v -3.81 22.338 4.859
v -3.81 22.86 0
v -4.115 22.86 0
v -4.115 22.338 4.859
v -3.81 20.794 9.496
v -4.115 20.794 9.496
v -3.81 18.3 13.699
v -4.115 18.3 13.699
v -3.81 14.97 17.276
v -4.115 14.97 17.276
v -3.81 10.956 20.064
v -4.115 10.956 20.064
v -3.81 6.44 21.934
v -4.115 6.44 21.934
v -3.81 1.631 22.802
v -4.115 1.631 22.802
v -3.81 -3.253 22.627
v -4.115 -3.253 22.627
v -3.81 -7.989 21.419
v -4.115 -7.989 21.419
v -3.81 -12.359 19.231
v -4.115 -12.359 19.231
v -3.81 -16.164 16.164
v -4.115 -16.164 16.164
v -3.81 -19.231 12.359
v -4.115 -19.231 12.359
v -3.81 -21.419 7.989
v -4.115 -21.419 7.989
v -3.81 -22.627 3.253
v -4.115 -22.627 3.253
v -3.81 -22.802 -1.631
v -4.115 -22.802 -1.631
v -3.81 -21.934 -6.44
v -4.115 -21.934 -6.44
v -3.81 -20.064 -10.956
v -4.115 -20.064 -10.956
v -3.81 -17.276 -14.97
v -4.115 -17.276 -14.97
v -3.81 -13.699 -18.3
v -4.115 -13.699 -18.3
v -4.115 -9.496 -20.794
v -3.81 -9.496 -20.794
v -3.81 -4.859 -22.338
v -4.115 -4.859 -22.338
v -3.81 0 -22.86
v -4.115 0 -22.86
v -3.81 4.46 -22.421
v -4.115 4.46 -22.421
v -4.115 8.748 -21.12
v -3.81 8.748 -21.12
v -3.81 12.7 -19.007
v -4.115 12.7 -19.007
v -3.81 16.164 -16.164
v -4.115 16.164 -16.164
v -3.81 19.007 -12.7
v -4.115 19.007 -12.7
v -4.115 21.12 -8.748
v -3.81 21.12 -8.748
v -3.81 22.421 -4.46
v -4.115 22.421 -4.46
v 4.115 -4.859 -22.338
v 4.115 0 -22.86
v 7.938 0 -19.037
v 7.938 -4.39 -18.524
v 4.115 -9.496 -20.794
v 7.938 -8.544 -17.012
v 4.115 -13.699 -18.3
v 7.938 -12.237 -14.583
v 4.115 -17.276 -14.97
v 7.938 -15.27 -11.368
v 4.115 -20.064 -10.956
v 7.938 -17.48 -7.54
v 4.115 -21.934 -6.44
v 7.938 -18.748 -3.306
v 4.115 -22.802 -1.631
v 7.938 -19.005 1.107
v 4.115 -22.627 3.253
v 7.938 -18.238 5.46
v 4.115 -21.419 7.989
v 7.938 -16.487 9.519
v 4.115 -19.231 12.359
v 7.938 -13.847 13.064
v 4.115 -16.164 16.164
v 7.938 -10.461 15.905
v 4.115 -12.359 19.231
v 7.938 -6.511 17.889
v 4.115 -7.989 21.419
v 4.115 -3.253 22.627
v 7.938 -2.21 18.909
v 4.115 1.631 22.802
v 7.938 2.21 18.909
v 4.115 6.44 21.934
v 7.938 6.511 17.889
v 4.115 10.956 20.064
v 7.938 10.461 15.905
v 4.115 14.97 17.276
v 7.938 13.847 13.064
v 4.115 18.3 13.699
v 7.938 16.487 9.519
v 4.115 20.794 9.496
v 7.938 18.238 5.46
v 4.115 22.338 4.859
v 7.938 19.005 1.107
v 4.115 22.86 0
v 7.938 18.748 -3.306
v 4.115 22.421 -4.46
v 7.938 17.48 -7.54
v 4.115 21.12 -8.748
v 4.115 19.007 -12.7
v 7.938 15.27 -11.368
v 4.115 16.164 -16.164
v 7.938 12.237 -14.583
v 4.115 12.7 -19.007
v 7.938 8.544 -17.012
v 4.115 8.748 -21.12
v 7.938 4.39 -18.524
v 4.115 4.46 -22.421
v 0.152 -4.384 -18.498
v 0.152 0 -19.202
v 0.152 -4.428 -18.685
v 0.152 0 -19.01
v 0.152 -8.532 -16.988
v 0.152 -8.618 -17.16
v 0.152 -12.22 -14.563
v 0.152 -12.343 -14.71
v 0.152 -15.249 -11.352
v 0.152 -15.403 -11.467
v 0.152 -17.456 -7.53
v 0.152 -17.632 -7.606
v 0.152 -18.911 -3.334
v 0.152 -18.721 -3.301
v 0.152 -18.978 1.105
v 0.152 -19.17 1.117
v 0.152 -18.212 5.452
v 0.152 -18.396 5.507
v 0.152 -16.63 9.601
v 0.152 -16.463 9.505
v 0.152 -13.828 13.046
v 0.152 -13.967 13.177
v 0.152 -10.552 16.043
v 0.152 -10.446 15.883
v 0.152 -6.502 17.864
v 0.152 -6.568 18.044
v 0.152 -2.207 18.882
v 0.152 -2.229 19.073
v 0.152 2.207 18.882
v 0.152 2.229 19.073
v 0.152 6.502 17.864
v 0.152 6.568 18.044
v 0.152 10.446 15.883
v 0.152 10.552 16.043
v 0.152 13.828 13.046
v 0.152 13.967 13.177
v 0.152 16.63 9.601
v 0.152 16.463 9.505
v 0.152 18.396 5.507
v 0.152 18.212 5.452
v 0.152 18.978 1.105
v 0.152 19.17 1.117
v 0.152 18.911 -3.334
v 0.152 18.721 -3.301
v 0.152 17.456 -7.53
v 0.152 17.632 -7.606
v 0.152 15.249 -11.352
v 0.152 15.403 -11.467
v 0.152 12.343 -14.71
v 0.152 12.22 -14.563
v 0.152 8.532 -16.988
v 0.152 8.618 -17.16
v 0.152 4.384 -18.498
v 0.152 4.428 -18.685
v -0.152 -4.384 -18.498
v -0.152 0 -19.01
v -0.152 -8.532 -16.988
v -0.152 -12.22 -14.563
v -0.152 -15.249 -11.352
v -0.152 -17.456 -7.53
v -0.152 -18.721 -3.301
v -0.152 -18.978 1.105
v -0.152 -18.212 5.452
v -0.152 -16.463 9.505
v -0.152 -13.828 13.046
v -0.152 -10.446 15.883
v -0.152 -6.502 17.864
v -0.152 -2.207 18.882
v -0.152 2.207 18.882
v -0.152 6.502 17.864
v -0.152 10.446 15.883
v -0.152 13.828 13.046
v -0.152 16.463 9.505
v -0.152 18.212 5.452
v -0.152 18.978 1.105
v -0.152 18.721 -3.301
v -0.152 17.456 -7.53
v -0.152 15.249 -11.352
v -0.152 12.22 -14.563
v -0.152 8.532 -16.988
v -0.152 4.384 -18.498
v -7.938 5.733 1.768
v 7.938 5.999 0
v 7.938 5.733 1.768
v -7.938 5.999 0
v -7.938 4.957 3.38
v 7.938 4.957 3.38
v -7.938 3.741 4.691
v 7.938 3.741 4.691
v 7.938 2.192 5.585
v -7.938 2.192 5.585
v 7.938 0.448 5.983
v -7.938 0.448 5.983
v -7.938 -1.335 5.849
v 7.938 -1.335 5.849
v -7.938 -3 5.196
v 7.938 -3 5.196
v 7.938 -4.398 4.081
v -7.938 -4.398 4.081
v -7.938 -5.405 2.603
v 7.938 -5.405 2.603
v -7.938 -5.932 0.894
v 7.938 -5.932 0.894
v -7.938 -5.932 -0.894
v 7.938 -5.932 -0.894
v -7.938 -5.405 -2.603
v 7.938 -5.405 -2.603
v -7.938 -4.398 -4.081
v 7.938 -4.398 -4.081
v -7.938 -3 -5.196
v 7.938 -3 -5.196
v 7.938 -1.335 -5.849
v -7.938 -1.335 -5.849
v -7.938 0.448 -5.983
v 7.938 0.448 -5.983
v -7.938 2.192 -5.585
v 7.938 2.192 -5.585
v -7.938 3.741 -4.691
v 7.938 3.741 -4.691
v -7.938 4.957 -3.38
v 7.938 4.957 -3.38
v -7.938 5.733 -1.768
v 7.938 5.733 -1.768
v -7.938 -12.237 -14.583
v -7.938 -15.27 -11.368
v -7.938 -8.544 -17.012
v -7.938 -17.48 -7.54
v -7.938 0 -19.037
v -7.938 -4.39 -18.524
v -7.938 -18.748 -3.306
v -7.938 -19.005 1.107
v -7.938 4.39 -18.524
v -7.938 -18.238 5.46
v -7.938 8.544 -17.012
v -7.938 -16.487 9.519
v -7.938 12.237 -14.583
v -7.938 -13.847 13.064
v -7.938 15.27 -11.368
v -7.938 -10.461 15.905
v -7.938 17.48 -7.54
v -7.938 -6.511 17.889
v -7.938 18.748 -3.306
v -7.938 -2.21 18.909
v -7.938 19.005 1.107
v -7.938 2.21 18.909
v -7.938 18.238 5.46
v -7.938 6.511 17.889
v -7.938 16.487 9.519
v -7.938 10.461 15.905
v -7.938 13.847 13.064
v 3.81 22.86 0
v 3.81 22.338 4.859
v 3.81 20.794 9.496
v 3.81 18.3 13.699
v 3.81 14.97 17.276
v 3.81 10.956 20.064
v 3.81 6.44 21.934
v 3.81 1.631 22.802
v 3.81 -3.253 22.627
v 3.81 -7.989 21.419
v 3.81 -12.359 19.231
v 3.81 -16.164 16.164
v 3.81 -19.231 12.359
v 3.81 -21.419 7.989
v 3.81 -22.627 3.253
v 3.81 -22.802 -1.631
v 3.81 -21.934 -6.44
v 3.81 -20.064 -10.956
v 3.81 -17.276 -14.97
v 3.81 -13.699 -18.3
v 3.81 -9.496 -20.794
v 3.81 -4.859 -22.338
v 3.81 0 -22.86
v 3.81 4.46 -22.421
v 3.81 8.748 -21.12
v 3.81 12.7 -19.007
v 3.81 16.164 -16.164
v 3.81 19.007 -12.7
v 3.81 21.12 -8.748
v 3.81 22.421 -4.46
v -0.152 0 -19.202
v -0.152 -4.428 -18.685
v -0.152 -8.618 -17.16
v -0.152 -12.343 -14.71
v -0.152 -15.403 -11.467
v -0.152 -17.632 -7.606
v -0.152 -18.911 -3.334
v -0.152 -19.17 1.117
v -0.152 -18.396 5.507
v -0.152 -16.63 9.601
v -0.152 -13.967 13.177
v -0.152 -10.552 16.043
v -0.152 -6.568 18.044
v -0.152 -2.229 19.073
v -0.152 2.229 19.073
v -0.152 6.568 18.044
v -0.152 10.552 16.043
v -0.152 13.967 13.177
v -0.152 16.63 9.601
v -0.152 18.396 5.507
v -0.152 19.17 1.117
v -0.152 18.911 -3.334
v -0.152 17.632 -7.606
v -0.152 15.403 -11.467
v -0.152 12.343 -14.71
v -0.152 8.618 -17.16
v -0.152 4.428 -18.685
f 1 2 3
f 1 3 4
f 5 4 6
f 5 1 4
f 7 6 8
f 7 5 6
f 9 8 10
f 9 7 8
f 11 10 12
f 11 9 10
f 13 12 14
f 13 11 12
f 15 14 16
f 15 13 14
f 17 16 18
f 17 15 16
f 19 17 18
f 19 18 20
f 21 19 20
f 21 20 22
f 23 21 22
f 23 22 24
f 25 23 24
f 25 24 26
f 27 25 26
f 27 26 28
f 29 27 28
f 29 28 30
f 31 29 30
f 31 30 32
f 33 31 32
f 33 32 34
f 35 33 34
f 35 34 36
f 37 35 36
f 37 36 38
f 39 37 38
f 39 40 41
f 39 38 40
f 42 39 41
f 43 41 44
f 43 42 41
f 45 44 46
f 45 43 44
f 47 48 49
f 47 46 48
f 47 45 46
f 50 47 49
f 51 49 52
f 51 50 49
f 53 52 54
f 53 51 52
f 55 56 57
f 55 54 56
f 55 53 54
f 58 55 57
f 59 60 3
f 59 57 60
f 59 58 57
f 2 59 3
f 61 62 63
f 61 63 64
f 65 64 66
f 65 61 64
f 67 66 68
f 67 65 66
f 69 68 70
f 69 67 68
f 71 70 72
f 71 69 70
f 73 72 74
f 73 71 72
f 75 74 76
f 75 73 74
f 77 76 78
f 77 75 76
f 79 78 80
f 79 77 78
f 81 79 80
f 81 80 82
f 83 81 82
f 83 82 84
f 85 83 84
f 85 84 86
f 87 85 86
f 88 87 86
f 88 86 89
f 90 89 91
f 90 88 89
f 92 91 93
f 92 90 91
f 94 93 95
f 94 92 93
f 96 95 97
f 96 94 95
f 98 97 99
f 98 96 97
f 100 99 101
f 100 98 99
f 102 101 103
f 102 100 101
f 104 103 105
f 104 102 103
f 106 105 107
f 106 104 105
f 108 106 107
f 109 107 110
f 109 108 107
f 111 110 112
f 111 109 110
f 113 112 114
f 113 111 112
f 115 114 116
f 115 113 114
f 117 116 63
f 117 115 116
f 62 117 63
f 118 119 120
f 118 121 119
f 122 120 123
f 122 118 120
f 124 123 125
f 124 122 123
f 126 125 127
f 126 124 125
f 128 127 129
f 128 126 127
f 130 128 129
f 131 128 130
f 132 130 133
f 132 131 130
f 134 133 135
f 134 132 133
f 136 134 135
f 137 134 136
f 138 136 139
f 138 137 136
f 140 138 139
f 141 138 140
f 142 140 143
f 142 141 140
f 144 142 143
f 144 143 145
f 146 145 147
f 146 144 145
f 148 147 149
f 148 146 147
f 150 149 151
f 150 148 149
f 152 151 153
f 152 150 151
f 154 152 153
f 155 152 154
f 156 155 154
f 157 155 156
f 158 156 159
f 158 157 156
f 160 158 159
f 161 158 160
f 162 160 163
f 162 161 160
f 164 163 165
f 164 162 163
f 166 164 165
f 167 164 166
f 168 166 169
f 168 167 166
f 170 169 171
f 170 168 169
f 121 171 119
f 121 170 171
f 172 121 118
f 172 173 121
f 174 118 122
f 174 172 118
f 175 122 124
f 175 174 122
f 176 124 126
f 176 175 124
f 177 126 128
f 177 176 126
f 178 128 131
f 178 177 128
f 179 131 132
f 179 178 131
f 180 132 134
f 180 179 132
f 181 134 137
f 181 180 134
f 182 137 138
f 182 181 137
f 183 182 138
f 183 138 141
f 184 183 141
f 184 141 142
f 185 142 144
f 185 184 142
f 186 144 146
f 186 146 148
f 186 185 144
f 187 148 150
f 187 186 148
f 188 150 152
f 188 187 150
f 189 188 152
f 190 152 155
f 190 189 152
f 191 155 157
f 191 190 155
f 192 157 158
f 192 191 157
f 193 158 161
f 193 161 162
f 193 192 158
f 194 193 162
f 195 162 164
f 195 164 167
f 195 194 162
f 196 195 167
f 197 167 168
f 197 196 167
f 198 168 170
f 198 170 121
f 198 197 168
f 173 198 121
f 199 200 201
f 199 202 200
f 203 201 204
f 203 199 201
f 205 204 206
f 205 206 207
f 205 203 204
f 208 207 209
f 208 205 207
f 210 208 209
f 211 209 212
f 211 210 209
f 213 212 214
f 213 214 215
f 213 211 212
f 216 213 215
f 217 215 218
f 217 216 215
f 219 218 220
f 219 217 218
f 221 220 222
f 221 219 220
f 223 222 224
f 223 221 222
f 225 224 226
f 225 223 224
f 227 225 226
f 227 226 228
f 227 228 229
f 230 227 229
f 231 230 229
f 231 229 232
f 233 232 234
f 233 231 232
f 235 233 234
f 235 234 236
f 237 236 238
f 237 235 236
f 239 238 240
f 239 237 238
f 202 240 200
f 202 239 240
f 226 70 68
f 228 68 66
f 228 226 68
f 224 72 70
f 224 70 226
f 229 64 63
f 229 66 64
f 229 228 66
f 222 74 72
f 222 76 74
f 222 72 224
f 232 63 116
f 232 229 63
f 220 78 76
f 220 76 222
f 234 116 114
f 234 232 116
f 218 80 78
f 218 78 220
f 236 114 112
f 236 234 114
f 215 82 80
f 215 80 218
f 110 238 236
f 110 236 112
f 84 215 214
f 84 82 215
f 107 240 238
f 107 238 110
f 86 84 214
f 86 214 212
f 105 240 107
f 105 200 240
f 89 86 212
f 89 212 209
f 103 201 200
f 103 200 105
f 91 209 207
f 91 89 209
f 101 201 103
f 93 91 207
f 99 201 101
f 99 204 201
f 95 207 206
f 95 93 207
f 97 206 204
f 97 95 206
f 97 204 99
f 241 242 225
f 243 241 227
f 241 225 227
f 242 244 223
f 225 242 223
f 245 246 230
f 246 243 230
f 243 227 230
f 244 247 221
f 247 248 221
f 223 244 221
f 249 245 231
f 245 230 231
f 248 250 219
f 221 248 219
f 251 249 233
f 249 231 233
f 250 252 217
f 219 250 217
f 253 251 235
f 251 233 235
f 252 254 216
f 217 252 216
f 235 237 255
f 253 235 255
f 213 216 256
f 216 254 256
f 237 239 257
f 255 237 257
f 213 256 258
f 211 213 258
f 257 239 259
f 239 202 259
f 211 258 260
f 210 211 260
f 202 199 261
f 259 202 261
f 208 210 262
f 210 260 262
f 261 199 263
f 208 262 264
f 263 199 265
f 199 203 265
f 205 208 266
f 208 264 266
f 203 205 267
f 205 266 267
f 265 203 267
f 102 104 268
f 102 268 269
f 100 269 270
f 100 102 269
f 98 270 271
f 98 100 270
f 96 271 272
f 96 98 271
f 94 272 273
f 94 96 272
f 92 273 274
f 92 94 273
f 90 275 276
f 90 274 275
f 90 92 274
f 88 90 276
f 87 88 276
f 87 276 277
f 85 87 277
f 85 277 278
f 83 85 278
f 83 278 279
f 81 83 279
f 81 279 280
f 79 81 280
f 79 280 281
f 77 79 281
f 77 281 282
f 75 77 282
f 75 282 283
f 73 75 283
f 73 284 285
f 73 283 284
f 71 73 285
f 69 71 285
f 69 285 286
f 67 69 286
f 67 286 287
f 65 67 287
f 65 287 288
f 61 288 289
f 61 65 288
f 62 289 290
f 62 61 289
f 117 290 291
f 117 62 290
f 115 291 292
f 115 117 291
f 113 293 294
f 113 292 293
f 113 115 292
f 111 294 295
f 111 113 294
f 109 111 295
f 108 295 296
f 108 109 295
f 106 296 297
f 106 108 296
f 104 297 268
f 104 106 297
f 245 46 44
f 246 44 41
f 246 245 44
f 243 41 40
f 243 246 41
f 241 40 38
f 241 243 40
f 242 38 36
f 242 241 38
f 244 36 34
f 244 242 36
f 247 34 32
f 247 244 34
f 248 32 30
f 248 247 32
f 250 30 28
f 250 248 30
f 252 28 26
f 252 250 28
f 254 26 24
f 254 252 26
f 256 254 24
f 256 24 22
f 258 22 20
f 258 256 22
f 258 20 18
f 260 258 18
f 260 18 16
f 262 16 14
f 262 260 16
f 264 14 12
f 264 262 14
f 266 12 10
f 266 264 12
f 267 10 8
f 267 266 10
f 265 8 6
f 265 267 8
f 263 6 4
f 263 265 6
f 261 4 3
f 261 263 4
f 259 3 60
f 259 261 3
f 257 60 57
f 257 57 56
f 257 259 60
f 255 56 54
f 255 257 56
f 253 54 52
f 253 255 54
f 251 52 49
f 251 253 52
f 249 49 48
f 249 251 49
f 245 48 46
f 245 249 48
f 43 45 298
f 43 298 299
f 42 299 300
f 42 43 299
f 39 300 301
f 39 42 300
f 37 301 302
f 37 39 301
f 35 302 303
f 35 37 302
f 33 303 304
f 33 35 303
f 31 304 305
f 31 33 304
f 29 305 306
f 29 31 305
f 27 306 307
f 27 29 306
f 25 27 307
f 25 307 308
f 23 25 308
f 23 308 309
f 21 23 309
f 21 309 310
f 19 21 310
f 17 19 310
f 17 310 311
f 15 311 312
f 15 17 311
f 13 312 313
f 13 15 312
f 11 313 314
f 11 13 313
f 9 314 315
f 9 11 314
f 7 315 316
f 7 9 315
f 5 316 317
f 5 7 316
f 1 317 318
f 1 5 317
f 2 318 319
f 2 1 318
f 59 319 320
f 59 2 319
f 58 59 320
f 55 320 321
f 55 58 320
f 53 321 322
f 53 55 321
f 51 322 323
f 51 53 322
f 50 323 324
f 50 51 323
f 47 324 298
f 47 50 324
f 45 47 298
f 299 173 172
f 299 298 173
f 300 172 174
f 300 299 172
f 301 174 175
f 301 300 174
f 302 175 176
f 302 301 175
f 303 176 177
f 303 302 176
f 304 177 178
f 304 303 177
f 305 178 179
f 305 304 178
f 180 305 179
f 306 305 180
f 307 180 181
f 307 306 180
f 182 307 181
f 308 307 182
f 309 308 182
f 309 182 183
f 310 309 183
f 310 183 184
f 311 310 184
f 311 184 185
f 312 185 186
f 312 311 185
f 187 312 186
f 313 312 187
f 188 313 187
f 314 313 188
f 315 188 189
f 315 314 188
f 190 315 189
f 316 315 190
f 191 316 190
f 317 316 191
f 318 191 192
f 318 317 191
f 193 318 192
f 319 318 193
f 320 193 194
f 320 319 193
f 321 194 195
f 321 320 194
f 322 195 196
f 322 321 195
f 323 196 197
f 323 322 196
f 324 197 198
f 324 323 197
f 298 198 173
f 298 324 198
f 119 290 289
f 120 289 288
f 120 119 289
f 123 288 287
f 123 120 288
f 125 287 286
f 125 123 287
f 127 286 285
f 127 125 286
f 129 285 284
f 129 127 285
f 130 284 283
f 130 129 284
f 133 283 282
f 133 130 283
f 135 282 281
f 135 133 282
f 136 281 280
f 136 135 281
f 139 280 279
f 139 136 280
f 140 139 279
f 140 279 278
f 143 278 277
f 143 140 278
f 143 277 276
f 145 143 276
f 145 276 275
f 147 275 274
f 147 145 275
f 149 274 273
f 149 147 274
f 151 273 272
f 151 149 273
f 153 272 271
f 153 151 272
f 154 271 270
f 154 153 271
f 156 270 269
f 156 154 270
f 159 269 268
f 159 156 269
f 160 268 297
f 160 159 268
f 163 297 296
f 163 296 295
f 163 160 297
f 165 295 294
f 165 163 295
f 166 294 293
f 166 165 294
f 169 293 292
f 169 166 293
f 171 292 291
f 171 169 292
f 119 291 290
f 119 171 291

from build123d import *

# Parameters (mm, degrees)
F0_R     = 22.86
F0_R_2   = 5.99948
F1_DEPTH = 7.9375


with BuildPart() as f1:
    # F0 (on Right) → F1 (new body, symmetric)
    with BuildSketch(Plane.YZ):
        Circle(F0_R)
        Circle(F0_R_2, mode=Mode.SUBTRACT)
    extrude(amount=F1_DEPTH, both=True)

    # F3: sweep along a path in F3_path
    with BuildLine(Plane(origin=(7.9375, 22.86, 0), x_dir=(0, 0, -1), z_dir=(-1, 0, 0))) as f3_path:
        CenterArc((0, 22.86), 22.86, 0, 360)
    # F2 (on Top) → F3 (sweep, cut)
    with BuildSketch(Plane.XY):
        Polygon((-4.1148, -22.86), (-7.9375, -19.0373), (-7.9375, -22.86), align=None)
        Polygon((-0.1524, -19.2024), (-3.81, -22.86), (3.81, -22.86), (0.1524, -19.2024), (0.1524, -19.0102346241), (0.0172294403, -19.0102346241), (-0.0172294403, -19.0102346241), (-0.1524, -19.0102346241), align=None)
        Polygon((7.9375, -19.0373), (4.1148, -22.86), (7.9375, -22.86), align=None)
    sweep(path=f3_path.line, mode=Mode.SUBTRACT)


solid = f1.part
